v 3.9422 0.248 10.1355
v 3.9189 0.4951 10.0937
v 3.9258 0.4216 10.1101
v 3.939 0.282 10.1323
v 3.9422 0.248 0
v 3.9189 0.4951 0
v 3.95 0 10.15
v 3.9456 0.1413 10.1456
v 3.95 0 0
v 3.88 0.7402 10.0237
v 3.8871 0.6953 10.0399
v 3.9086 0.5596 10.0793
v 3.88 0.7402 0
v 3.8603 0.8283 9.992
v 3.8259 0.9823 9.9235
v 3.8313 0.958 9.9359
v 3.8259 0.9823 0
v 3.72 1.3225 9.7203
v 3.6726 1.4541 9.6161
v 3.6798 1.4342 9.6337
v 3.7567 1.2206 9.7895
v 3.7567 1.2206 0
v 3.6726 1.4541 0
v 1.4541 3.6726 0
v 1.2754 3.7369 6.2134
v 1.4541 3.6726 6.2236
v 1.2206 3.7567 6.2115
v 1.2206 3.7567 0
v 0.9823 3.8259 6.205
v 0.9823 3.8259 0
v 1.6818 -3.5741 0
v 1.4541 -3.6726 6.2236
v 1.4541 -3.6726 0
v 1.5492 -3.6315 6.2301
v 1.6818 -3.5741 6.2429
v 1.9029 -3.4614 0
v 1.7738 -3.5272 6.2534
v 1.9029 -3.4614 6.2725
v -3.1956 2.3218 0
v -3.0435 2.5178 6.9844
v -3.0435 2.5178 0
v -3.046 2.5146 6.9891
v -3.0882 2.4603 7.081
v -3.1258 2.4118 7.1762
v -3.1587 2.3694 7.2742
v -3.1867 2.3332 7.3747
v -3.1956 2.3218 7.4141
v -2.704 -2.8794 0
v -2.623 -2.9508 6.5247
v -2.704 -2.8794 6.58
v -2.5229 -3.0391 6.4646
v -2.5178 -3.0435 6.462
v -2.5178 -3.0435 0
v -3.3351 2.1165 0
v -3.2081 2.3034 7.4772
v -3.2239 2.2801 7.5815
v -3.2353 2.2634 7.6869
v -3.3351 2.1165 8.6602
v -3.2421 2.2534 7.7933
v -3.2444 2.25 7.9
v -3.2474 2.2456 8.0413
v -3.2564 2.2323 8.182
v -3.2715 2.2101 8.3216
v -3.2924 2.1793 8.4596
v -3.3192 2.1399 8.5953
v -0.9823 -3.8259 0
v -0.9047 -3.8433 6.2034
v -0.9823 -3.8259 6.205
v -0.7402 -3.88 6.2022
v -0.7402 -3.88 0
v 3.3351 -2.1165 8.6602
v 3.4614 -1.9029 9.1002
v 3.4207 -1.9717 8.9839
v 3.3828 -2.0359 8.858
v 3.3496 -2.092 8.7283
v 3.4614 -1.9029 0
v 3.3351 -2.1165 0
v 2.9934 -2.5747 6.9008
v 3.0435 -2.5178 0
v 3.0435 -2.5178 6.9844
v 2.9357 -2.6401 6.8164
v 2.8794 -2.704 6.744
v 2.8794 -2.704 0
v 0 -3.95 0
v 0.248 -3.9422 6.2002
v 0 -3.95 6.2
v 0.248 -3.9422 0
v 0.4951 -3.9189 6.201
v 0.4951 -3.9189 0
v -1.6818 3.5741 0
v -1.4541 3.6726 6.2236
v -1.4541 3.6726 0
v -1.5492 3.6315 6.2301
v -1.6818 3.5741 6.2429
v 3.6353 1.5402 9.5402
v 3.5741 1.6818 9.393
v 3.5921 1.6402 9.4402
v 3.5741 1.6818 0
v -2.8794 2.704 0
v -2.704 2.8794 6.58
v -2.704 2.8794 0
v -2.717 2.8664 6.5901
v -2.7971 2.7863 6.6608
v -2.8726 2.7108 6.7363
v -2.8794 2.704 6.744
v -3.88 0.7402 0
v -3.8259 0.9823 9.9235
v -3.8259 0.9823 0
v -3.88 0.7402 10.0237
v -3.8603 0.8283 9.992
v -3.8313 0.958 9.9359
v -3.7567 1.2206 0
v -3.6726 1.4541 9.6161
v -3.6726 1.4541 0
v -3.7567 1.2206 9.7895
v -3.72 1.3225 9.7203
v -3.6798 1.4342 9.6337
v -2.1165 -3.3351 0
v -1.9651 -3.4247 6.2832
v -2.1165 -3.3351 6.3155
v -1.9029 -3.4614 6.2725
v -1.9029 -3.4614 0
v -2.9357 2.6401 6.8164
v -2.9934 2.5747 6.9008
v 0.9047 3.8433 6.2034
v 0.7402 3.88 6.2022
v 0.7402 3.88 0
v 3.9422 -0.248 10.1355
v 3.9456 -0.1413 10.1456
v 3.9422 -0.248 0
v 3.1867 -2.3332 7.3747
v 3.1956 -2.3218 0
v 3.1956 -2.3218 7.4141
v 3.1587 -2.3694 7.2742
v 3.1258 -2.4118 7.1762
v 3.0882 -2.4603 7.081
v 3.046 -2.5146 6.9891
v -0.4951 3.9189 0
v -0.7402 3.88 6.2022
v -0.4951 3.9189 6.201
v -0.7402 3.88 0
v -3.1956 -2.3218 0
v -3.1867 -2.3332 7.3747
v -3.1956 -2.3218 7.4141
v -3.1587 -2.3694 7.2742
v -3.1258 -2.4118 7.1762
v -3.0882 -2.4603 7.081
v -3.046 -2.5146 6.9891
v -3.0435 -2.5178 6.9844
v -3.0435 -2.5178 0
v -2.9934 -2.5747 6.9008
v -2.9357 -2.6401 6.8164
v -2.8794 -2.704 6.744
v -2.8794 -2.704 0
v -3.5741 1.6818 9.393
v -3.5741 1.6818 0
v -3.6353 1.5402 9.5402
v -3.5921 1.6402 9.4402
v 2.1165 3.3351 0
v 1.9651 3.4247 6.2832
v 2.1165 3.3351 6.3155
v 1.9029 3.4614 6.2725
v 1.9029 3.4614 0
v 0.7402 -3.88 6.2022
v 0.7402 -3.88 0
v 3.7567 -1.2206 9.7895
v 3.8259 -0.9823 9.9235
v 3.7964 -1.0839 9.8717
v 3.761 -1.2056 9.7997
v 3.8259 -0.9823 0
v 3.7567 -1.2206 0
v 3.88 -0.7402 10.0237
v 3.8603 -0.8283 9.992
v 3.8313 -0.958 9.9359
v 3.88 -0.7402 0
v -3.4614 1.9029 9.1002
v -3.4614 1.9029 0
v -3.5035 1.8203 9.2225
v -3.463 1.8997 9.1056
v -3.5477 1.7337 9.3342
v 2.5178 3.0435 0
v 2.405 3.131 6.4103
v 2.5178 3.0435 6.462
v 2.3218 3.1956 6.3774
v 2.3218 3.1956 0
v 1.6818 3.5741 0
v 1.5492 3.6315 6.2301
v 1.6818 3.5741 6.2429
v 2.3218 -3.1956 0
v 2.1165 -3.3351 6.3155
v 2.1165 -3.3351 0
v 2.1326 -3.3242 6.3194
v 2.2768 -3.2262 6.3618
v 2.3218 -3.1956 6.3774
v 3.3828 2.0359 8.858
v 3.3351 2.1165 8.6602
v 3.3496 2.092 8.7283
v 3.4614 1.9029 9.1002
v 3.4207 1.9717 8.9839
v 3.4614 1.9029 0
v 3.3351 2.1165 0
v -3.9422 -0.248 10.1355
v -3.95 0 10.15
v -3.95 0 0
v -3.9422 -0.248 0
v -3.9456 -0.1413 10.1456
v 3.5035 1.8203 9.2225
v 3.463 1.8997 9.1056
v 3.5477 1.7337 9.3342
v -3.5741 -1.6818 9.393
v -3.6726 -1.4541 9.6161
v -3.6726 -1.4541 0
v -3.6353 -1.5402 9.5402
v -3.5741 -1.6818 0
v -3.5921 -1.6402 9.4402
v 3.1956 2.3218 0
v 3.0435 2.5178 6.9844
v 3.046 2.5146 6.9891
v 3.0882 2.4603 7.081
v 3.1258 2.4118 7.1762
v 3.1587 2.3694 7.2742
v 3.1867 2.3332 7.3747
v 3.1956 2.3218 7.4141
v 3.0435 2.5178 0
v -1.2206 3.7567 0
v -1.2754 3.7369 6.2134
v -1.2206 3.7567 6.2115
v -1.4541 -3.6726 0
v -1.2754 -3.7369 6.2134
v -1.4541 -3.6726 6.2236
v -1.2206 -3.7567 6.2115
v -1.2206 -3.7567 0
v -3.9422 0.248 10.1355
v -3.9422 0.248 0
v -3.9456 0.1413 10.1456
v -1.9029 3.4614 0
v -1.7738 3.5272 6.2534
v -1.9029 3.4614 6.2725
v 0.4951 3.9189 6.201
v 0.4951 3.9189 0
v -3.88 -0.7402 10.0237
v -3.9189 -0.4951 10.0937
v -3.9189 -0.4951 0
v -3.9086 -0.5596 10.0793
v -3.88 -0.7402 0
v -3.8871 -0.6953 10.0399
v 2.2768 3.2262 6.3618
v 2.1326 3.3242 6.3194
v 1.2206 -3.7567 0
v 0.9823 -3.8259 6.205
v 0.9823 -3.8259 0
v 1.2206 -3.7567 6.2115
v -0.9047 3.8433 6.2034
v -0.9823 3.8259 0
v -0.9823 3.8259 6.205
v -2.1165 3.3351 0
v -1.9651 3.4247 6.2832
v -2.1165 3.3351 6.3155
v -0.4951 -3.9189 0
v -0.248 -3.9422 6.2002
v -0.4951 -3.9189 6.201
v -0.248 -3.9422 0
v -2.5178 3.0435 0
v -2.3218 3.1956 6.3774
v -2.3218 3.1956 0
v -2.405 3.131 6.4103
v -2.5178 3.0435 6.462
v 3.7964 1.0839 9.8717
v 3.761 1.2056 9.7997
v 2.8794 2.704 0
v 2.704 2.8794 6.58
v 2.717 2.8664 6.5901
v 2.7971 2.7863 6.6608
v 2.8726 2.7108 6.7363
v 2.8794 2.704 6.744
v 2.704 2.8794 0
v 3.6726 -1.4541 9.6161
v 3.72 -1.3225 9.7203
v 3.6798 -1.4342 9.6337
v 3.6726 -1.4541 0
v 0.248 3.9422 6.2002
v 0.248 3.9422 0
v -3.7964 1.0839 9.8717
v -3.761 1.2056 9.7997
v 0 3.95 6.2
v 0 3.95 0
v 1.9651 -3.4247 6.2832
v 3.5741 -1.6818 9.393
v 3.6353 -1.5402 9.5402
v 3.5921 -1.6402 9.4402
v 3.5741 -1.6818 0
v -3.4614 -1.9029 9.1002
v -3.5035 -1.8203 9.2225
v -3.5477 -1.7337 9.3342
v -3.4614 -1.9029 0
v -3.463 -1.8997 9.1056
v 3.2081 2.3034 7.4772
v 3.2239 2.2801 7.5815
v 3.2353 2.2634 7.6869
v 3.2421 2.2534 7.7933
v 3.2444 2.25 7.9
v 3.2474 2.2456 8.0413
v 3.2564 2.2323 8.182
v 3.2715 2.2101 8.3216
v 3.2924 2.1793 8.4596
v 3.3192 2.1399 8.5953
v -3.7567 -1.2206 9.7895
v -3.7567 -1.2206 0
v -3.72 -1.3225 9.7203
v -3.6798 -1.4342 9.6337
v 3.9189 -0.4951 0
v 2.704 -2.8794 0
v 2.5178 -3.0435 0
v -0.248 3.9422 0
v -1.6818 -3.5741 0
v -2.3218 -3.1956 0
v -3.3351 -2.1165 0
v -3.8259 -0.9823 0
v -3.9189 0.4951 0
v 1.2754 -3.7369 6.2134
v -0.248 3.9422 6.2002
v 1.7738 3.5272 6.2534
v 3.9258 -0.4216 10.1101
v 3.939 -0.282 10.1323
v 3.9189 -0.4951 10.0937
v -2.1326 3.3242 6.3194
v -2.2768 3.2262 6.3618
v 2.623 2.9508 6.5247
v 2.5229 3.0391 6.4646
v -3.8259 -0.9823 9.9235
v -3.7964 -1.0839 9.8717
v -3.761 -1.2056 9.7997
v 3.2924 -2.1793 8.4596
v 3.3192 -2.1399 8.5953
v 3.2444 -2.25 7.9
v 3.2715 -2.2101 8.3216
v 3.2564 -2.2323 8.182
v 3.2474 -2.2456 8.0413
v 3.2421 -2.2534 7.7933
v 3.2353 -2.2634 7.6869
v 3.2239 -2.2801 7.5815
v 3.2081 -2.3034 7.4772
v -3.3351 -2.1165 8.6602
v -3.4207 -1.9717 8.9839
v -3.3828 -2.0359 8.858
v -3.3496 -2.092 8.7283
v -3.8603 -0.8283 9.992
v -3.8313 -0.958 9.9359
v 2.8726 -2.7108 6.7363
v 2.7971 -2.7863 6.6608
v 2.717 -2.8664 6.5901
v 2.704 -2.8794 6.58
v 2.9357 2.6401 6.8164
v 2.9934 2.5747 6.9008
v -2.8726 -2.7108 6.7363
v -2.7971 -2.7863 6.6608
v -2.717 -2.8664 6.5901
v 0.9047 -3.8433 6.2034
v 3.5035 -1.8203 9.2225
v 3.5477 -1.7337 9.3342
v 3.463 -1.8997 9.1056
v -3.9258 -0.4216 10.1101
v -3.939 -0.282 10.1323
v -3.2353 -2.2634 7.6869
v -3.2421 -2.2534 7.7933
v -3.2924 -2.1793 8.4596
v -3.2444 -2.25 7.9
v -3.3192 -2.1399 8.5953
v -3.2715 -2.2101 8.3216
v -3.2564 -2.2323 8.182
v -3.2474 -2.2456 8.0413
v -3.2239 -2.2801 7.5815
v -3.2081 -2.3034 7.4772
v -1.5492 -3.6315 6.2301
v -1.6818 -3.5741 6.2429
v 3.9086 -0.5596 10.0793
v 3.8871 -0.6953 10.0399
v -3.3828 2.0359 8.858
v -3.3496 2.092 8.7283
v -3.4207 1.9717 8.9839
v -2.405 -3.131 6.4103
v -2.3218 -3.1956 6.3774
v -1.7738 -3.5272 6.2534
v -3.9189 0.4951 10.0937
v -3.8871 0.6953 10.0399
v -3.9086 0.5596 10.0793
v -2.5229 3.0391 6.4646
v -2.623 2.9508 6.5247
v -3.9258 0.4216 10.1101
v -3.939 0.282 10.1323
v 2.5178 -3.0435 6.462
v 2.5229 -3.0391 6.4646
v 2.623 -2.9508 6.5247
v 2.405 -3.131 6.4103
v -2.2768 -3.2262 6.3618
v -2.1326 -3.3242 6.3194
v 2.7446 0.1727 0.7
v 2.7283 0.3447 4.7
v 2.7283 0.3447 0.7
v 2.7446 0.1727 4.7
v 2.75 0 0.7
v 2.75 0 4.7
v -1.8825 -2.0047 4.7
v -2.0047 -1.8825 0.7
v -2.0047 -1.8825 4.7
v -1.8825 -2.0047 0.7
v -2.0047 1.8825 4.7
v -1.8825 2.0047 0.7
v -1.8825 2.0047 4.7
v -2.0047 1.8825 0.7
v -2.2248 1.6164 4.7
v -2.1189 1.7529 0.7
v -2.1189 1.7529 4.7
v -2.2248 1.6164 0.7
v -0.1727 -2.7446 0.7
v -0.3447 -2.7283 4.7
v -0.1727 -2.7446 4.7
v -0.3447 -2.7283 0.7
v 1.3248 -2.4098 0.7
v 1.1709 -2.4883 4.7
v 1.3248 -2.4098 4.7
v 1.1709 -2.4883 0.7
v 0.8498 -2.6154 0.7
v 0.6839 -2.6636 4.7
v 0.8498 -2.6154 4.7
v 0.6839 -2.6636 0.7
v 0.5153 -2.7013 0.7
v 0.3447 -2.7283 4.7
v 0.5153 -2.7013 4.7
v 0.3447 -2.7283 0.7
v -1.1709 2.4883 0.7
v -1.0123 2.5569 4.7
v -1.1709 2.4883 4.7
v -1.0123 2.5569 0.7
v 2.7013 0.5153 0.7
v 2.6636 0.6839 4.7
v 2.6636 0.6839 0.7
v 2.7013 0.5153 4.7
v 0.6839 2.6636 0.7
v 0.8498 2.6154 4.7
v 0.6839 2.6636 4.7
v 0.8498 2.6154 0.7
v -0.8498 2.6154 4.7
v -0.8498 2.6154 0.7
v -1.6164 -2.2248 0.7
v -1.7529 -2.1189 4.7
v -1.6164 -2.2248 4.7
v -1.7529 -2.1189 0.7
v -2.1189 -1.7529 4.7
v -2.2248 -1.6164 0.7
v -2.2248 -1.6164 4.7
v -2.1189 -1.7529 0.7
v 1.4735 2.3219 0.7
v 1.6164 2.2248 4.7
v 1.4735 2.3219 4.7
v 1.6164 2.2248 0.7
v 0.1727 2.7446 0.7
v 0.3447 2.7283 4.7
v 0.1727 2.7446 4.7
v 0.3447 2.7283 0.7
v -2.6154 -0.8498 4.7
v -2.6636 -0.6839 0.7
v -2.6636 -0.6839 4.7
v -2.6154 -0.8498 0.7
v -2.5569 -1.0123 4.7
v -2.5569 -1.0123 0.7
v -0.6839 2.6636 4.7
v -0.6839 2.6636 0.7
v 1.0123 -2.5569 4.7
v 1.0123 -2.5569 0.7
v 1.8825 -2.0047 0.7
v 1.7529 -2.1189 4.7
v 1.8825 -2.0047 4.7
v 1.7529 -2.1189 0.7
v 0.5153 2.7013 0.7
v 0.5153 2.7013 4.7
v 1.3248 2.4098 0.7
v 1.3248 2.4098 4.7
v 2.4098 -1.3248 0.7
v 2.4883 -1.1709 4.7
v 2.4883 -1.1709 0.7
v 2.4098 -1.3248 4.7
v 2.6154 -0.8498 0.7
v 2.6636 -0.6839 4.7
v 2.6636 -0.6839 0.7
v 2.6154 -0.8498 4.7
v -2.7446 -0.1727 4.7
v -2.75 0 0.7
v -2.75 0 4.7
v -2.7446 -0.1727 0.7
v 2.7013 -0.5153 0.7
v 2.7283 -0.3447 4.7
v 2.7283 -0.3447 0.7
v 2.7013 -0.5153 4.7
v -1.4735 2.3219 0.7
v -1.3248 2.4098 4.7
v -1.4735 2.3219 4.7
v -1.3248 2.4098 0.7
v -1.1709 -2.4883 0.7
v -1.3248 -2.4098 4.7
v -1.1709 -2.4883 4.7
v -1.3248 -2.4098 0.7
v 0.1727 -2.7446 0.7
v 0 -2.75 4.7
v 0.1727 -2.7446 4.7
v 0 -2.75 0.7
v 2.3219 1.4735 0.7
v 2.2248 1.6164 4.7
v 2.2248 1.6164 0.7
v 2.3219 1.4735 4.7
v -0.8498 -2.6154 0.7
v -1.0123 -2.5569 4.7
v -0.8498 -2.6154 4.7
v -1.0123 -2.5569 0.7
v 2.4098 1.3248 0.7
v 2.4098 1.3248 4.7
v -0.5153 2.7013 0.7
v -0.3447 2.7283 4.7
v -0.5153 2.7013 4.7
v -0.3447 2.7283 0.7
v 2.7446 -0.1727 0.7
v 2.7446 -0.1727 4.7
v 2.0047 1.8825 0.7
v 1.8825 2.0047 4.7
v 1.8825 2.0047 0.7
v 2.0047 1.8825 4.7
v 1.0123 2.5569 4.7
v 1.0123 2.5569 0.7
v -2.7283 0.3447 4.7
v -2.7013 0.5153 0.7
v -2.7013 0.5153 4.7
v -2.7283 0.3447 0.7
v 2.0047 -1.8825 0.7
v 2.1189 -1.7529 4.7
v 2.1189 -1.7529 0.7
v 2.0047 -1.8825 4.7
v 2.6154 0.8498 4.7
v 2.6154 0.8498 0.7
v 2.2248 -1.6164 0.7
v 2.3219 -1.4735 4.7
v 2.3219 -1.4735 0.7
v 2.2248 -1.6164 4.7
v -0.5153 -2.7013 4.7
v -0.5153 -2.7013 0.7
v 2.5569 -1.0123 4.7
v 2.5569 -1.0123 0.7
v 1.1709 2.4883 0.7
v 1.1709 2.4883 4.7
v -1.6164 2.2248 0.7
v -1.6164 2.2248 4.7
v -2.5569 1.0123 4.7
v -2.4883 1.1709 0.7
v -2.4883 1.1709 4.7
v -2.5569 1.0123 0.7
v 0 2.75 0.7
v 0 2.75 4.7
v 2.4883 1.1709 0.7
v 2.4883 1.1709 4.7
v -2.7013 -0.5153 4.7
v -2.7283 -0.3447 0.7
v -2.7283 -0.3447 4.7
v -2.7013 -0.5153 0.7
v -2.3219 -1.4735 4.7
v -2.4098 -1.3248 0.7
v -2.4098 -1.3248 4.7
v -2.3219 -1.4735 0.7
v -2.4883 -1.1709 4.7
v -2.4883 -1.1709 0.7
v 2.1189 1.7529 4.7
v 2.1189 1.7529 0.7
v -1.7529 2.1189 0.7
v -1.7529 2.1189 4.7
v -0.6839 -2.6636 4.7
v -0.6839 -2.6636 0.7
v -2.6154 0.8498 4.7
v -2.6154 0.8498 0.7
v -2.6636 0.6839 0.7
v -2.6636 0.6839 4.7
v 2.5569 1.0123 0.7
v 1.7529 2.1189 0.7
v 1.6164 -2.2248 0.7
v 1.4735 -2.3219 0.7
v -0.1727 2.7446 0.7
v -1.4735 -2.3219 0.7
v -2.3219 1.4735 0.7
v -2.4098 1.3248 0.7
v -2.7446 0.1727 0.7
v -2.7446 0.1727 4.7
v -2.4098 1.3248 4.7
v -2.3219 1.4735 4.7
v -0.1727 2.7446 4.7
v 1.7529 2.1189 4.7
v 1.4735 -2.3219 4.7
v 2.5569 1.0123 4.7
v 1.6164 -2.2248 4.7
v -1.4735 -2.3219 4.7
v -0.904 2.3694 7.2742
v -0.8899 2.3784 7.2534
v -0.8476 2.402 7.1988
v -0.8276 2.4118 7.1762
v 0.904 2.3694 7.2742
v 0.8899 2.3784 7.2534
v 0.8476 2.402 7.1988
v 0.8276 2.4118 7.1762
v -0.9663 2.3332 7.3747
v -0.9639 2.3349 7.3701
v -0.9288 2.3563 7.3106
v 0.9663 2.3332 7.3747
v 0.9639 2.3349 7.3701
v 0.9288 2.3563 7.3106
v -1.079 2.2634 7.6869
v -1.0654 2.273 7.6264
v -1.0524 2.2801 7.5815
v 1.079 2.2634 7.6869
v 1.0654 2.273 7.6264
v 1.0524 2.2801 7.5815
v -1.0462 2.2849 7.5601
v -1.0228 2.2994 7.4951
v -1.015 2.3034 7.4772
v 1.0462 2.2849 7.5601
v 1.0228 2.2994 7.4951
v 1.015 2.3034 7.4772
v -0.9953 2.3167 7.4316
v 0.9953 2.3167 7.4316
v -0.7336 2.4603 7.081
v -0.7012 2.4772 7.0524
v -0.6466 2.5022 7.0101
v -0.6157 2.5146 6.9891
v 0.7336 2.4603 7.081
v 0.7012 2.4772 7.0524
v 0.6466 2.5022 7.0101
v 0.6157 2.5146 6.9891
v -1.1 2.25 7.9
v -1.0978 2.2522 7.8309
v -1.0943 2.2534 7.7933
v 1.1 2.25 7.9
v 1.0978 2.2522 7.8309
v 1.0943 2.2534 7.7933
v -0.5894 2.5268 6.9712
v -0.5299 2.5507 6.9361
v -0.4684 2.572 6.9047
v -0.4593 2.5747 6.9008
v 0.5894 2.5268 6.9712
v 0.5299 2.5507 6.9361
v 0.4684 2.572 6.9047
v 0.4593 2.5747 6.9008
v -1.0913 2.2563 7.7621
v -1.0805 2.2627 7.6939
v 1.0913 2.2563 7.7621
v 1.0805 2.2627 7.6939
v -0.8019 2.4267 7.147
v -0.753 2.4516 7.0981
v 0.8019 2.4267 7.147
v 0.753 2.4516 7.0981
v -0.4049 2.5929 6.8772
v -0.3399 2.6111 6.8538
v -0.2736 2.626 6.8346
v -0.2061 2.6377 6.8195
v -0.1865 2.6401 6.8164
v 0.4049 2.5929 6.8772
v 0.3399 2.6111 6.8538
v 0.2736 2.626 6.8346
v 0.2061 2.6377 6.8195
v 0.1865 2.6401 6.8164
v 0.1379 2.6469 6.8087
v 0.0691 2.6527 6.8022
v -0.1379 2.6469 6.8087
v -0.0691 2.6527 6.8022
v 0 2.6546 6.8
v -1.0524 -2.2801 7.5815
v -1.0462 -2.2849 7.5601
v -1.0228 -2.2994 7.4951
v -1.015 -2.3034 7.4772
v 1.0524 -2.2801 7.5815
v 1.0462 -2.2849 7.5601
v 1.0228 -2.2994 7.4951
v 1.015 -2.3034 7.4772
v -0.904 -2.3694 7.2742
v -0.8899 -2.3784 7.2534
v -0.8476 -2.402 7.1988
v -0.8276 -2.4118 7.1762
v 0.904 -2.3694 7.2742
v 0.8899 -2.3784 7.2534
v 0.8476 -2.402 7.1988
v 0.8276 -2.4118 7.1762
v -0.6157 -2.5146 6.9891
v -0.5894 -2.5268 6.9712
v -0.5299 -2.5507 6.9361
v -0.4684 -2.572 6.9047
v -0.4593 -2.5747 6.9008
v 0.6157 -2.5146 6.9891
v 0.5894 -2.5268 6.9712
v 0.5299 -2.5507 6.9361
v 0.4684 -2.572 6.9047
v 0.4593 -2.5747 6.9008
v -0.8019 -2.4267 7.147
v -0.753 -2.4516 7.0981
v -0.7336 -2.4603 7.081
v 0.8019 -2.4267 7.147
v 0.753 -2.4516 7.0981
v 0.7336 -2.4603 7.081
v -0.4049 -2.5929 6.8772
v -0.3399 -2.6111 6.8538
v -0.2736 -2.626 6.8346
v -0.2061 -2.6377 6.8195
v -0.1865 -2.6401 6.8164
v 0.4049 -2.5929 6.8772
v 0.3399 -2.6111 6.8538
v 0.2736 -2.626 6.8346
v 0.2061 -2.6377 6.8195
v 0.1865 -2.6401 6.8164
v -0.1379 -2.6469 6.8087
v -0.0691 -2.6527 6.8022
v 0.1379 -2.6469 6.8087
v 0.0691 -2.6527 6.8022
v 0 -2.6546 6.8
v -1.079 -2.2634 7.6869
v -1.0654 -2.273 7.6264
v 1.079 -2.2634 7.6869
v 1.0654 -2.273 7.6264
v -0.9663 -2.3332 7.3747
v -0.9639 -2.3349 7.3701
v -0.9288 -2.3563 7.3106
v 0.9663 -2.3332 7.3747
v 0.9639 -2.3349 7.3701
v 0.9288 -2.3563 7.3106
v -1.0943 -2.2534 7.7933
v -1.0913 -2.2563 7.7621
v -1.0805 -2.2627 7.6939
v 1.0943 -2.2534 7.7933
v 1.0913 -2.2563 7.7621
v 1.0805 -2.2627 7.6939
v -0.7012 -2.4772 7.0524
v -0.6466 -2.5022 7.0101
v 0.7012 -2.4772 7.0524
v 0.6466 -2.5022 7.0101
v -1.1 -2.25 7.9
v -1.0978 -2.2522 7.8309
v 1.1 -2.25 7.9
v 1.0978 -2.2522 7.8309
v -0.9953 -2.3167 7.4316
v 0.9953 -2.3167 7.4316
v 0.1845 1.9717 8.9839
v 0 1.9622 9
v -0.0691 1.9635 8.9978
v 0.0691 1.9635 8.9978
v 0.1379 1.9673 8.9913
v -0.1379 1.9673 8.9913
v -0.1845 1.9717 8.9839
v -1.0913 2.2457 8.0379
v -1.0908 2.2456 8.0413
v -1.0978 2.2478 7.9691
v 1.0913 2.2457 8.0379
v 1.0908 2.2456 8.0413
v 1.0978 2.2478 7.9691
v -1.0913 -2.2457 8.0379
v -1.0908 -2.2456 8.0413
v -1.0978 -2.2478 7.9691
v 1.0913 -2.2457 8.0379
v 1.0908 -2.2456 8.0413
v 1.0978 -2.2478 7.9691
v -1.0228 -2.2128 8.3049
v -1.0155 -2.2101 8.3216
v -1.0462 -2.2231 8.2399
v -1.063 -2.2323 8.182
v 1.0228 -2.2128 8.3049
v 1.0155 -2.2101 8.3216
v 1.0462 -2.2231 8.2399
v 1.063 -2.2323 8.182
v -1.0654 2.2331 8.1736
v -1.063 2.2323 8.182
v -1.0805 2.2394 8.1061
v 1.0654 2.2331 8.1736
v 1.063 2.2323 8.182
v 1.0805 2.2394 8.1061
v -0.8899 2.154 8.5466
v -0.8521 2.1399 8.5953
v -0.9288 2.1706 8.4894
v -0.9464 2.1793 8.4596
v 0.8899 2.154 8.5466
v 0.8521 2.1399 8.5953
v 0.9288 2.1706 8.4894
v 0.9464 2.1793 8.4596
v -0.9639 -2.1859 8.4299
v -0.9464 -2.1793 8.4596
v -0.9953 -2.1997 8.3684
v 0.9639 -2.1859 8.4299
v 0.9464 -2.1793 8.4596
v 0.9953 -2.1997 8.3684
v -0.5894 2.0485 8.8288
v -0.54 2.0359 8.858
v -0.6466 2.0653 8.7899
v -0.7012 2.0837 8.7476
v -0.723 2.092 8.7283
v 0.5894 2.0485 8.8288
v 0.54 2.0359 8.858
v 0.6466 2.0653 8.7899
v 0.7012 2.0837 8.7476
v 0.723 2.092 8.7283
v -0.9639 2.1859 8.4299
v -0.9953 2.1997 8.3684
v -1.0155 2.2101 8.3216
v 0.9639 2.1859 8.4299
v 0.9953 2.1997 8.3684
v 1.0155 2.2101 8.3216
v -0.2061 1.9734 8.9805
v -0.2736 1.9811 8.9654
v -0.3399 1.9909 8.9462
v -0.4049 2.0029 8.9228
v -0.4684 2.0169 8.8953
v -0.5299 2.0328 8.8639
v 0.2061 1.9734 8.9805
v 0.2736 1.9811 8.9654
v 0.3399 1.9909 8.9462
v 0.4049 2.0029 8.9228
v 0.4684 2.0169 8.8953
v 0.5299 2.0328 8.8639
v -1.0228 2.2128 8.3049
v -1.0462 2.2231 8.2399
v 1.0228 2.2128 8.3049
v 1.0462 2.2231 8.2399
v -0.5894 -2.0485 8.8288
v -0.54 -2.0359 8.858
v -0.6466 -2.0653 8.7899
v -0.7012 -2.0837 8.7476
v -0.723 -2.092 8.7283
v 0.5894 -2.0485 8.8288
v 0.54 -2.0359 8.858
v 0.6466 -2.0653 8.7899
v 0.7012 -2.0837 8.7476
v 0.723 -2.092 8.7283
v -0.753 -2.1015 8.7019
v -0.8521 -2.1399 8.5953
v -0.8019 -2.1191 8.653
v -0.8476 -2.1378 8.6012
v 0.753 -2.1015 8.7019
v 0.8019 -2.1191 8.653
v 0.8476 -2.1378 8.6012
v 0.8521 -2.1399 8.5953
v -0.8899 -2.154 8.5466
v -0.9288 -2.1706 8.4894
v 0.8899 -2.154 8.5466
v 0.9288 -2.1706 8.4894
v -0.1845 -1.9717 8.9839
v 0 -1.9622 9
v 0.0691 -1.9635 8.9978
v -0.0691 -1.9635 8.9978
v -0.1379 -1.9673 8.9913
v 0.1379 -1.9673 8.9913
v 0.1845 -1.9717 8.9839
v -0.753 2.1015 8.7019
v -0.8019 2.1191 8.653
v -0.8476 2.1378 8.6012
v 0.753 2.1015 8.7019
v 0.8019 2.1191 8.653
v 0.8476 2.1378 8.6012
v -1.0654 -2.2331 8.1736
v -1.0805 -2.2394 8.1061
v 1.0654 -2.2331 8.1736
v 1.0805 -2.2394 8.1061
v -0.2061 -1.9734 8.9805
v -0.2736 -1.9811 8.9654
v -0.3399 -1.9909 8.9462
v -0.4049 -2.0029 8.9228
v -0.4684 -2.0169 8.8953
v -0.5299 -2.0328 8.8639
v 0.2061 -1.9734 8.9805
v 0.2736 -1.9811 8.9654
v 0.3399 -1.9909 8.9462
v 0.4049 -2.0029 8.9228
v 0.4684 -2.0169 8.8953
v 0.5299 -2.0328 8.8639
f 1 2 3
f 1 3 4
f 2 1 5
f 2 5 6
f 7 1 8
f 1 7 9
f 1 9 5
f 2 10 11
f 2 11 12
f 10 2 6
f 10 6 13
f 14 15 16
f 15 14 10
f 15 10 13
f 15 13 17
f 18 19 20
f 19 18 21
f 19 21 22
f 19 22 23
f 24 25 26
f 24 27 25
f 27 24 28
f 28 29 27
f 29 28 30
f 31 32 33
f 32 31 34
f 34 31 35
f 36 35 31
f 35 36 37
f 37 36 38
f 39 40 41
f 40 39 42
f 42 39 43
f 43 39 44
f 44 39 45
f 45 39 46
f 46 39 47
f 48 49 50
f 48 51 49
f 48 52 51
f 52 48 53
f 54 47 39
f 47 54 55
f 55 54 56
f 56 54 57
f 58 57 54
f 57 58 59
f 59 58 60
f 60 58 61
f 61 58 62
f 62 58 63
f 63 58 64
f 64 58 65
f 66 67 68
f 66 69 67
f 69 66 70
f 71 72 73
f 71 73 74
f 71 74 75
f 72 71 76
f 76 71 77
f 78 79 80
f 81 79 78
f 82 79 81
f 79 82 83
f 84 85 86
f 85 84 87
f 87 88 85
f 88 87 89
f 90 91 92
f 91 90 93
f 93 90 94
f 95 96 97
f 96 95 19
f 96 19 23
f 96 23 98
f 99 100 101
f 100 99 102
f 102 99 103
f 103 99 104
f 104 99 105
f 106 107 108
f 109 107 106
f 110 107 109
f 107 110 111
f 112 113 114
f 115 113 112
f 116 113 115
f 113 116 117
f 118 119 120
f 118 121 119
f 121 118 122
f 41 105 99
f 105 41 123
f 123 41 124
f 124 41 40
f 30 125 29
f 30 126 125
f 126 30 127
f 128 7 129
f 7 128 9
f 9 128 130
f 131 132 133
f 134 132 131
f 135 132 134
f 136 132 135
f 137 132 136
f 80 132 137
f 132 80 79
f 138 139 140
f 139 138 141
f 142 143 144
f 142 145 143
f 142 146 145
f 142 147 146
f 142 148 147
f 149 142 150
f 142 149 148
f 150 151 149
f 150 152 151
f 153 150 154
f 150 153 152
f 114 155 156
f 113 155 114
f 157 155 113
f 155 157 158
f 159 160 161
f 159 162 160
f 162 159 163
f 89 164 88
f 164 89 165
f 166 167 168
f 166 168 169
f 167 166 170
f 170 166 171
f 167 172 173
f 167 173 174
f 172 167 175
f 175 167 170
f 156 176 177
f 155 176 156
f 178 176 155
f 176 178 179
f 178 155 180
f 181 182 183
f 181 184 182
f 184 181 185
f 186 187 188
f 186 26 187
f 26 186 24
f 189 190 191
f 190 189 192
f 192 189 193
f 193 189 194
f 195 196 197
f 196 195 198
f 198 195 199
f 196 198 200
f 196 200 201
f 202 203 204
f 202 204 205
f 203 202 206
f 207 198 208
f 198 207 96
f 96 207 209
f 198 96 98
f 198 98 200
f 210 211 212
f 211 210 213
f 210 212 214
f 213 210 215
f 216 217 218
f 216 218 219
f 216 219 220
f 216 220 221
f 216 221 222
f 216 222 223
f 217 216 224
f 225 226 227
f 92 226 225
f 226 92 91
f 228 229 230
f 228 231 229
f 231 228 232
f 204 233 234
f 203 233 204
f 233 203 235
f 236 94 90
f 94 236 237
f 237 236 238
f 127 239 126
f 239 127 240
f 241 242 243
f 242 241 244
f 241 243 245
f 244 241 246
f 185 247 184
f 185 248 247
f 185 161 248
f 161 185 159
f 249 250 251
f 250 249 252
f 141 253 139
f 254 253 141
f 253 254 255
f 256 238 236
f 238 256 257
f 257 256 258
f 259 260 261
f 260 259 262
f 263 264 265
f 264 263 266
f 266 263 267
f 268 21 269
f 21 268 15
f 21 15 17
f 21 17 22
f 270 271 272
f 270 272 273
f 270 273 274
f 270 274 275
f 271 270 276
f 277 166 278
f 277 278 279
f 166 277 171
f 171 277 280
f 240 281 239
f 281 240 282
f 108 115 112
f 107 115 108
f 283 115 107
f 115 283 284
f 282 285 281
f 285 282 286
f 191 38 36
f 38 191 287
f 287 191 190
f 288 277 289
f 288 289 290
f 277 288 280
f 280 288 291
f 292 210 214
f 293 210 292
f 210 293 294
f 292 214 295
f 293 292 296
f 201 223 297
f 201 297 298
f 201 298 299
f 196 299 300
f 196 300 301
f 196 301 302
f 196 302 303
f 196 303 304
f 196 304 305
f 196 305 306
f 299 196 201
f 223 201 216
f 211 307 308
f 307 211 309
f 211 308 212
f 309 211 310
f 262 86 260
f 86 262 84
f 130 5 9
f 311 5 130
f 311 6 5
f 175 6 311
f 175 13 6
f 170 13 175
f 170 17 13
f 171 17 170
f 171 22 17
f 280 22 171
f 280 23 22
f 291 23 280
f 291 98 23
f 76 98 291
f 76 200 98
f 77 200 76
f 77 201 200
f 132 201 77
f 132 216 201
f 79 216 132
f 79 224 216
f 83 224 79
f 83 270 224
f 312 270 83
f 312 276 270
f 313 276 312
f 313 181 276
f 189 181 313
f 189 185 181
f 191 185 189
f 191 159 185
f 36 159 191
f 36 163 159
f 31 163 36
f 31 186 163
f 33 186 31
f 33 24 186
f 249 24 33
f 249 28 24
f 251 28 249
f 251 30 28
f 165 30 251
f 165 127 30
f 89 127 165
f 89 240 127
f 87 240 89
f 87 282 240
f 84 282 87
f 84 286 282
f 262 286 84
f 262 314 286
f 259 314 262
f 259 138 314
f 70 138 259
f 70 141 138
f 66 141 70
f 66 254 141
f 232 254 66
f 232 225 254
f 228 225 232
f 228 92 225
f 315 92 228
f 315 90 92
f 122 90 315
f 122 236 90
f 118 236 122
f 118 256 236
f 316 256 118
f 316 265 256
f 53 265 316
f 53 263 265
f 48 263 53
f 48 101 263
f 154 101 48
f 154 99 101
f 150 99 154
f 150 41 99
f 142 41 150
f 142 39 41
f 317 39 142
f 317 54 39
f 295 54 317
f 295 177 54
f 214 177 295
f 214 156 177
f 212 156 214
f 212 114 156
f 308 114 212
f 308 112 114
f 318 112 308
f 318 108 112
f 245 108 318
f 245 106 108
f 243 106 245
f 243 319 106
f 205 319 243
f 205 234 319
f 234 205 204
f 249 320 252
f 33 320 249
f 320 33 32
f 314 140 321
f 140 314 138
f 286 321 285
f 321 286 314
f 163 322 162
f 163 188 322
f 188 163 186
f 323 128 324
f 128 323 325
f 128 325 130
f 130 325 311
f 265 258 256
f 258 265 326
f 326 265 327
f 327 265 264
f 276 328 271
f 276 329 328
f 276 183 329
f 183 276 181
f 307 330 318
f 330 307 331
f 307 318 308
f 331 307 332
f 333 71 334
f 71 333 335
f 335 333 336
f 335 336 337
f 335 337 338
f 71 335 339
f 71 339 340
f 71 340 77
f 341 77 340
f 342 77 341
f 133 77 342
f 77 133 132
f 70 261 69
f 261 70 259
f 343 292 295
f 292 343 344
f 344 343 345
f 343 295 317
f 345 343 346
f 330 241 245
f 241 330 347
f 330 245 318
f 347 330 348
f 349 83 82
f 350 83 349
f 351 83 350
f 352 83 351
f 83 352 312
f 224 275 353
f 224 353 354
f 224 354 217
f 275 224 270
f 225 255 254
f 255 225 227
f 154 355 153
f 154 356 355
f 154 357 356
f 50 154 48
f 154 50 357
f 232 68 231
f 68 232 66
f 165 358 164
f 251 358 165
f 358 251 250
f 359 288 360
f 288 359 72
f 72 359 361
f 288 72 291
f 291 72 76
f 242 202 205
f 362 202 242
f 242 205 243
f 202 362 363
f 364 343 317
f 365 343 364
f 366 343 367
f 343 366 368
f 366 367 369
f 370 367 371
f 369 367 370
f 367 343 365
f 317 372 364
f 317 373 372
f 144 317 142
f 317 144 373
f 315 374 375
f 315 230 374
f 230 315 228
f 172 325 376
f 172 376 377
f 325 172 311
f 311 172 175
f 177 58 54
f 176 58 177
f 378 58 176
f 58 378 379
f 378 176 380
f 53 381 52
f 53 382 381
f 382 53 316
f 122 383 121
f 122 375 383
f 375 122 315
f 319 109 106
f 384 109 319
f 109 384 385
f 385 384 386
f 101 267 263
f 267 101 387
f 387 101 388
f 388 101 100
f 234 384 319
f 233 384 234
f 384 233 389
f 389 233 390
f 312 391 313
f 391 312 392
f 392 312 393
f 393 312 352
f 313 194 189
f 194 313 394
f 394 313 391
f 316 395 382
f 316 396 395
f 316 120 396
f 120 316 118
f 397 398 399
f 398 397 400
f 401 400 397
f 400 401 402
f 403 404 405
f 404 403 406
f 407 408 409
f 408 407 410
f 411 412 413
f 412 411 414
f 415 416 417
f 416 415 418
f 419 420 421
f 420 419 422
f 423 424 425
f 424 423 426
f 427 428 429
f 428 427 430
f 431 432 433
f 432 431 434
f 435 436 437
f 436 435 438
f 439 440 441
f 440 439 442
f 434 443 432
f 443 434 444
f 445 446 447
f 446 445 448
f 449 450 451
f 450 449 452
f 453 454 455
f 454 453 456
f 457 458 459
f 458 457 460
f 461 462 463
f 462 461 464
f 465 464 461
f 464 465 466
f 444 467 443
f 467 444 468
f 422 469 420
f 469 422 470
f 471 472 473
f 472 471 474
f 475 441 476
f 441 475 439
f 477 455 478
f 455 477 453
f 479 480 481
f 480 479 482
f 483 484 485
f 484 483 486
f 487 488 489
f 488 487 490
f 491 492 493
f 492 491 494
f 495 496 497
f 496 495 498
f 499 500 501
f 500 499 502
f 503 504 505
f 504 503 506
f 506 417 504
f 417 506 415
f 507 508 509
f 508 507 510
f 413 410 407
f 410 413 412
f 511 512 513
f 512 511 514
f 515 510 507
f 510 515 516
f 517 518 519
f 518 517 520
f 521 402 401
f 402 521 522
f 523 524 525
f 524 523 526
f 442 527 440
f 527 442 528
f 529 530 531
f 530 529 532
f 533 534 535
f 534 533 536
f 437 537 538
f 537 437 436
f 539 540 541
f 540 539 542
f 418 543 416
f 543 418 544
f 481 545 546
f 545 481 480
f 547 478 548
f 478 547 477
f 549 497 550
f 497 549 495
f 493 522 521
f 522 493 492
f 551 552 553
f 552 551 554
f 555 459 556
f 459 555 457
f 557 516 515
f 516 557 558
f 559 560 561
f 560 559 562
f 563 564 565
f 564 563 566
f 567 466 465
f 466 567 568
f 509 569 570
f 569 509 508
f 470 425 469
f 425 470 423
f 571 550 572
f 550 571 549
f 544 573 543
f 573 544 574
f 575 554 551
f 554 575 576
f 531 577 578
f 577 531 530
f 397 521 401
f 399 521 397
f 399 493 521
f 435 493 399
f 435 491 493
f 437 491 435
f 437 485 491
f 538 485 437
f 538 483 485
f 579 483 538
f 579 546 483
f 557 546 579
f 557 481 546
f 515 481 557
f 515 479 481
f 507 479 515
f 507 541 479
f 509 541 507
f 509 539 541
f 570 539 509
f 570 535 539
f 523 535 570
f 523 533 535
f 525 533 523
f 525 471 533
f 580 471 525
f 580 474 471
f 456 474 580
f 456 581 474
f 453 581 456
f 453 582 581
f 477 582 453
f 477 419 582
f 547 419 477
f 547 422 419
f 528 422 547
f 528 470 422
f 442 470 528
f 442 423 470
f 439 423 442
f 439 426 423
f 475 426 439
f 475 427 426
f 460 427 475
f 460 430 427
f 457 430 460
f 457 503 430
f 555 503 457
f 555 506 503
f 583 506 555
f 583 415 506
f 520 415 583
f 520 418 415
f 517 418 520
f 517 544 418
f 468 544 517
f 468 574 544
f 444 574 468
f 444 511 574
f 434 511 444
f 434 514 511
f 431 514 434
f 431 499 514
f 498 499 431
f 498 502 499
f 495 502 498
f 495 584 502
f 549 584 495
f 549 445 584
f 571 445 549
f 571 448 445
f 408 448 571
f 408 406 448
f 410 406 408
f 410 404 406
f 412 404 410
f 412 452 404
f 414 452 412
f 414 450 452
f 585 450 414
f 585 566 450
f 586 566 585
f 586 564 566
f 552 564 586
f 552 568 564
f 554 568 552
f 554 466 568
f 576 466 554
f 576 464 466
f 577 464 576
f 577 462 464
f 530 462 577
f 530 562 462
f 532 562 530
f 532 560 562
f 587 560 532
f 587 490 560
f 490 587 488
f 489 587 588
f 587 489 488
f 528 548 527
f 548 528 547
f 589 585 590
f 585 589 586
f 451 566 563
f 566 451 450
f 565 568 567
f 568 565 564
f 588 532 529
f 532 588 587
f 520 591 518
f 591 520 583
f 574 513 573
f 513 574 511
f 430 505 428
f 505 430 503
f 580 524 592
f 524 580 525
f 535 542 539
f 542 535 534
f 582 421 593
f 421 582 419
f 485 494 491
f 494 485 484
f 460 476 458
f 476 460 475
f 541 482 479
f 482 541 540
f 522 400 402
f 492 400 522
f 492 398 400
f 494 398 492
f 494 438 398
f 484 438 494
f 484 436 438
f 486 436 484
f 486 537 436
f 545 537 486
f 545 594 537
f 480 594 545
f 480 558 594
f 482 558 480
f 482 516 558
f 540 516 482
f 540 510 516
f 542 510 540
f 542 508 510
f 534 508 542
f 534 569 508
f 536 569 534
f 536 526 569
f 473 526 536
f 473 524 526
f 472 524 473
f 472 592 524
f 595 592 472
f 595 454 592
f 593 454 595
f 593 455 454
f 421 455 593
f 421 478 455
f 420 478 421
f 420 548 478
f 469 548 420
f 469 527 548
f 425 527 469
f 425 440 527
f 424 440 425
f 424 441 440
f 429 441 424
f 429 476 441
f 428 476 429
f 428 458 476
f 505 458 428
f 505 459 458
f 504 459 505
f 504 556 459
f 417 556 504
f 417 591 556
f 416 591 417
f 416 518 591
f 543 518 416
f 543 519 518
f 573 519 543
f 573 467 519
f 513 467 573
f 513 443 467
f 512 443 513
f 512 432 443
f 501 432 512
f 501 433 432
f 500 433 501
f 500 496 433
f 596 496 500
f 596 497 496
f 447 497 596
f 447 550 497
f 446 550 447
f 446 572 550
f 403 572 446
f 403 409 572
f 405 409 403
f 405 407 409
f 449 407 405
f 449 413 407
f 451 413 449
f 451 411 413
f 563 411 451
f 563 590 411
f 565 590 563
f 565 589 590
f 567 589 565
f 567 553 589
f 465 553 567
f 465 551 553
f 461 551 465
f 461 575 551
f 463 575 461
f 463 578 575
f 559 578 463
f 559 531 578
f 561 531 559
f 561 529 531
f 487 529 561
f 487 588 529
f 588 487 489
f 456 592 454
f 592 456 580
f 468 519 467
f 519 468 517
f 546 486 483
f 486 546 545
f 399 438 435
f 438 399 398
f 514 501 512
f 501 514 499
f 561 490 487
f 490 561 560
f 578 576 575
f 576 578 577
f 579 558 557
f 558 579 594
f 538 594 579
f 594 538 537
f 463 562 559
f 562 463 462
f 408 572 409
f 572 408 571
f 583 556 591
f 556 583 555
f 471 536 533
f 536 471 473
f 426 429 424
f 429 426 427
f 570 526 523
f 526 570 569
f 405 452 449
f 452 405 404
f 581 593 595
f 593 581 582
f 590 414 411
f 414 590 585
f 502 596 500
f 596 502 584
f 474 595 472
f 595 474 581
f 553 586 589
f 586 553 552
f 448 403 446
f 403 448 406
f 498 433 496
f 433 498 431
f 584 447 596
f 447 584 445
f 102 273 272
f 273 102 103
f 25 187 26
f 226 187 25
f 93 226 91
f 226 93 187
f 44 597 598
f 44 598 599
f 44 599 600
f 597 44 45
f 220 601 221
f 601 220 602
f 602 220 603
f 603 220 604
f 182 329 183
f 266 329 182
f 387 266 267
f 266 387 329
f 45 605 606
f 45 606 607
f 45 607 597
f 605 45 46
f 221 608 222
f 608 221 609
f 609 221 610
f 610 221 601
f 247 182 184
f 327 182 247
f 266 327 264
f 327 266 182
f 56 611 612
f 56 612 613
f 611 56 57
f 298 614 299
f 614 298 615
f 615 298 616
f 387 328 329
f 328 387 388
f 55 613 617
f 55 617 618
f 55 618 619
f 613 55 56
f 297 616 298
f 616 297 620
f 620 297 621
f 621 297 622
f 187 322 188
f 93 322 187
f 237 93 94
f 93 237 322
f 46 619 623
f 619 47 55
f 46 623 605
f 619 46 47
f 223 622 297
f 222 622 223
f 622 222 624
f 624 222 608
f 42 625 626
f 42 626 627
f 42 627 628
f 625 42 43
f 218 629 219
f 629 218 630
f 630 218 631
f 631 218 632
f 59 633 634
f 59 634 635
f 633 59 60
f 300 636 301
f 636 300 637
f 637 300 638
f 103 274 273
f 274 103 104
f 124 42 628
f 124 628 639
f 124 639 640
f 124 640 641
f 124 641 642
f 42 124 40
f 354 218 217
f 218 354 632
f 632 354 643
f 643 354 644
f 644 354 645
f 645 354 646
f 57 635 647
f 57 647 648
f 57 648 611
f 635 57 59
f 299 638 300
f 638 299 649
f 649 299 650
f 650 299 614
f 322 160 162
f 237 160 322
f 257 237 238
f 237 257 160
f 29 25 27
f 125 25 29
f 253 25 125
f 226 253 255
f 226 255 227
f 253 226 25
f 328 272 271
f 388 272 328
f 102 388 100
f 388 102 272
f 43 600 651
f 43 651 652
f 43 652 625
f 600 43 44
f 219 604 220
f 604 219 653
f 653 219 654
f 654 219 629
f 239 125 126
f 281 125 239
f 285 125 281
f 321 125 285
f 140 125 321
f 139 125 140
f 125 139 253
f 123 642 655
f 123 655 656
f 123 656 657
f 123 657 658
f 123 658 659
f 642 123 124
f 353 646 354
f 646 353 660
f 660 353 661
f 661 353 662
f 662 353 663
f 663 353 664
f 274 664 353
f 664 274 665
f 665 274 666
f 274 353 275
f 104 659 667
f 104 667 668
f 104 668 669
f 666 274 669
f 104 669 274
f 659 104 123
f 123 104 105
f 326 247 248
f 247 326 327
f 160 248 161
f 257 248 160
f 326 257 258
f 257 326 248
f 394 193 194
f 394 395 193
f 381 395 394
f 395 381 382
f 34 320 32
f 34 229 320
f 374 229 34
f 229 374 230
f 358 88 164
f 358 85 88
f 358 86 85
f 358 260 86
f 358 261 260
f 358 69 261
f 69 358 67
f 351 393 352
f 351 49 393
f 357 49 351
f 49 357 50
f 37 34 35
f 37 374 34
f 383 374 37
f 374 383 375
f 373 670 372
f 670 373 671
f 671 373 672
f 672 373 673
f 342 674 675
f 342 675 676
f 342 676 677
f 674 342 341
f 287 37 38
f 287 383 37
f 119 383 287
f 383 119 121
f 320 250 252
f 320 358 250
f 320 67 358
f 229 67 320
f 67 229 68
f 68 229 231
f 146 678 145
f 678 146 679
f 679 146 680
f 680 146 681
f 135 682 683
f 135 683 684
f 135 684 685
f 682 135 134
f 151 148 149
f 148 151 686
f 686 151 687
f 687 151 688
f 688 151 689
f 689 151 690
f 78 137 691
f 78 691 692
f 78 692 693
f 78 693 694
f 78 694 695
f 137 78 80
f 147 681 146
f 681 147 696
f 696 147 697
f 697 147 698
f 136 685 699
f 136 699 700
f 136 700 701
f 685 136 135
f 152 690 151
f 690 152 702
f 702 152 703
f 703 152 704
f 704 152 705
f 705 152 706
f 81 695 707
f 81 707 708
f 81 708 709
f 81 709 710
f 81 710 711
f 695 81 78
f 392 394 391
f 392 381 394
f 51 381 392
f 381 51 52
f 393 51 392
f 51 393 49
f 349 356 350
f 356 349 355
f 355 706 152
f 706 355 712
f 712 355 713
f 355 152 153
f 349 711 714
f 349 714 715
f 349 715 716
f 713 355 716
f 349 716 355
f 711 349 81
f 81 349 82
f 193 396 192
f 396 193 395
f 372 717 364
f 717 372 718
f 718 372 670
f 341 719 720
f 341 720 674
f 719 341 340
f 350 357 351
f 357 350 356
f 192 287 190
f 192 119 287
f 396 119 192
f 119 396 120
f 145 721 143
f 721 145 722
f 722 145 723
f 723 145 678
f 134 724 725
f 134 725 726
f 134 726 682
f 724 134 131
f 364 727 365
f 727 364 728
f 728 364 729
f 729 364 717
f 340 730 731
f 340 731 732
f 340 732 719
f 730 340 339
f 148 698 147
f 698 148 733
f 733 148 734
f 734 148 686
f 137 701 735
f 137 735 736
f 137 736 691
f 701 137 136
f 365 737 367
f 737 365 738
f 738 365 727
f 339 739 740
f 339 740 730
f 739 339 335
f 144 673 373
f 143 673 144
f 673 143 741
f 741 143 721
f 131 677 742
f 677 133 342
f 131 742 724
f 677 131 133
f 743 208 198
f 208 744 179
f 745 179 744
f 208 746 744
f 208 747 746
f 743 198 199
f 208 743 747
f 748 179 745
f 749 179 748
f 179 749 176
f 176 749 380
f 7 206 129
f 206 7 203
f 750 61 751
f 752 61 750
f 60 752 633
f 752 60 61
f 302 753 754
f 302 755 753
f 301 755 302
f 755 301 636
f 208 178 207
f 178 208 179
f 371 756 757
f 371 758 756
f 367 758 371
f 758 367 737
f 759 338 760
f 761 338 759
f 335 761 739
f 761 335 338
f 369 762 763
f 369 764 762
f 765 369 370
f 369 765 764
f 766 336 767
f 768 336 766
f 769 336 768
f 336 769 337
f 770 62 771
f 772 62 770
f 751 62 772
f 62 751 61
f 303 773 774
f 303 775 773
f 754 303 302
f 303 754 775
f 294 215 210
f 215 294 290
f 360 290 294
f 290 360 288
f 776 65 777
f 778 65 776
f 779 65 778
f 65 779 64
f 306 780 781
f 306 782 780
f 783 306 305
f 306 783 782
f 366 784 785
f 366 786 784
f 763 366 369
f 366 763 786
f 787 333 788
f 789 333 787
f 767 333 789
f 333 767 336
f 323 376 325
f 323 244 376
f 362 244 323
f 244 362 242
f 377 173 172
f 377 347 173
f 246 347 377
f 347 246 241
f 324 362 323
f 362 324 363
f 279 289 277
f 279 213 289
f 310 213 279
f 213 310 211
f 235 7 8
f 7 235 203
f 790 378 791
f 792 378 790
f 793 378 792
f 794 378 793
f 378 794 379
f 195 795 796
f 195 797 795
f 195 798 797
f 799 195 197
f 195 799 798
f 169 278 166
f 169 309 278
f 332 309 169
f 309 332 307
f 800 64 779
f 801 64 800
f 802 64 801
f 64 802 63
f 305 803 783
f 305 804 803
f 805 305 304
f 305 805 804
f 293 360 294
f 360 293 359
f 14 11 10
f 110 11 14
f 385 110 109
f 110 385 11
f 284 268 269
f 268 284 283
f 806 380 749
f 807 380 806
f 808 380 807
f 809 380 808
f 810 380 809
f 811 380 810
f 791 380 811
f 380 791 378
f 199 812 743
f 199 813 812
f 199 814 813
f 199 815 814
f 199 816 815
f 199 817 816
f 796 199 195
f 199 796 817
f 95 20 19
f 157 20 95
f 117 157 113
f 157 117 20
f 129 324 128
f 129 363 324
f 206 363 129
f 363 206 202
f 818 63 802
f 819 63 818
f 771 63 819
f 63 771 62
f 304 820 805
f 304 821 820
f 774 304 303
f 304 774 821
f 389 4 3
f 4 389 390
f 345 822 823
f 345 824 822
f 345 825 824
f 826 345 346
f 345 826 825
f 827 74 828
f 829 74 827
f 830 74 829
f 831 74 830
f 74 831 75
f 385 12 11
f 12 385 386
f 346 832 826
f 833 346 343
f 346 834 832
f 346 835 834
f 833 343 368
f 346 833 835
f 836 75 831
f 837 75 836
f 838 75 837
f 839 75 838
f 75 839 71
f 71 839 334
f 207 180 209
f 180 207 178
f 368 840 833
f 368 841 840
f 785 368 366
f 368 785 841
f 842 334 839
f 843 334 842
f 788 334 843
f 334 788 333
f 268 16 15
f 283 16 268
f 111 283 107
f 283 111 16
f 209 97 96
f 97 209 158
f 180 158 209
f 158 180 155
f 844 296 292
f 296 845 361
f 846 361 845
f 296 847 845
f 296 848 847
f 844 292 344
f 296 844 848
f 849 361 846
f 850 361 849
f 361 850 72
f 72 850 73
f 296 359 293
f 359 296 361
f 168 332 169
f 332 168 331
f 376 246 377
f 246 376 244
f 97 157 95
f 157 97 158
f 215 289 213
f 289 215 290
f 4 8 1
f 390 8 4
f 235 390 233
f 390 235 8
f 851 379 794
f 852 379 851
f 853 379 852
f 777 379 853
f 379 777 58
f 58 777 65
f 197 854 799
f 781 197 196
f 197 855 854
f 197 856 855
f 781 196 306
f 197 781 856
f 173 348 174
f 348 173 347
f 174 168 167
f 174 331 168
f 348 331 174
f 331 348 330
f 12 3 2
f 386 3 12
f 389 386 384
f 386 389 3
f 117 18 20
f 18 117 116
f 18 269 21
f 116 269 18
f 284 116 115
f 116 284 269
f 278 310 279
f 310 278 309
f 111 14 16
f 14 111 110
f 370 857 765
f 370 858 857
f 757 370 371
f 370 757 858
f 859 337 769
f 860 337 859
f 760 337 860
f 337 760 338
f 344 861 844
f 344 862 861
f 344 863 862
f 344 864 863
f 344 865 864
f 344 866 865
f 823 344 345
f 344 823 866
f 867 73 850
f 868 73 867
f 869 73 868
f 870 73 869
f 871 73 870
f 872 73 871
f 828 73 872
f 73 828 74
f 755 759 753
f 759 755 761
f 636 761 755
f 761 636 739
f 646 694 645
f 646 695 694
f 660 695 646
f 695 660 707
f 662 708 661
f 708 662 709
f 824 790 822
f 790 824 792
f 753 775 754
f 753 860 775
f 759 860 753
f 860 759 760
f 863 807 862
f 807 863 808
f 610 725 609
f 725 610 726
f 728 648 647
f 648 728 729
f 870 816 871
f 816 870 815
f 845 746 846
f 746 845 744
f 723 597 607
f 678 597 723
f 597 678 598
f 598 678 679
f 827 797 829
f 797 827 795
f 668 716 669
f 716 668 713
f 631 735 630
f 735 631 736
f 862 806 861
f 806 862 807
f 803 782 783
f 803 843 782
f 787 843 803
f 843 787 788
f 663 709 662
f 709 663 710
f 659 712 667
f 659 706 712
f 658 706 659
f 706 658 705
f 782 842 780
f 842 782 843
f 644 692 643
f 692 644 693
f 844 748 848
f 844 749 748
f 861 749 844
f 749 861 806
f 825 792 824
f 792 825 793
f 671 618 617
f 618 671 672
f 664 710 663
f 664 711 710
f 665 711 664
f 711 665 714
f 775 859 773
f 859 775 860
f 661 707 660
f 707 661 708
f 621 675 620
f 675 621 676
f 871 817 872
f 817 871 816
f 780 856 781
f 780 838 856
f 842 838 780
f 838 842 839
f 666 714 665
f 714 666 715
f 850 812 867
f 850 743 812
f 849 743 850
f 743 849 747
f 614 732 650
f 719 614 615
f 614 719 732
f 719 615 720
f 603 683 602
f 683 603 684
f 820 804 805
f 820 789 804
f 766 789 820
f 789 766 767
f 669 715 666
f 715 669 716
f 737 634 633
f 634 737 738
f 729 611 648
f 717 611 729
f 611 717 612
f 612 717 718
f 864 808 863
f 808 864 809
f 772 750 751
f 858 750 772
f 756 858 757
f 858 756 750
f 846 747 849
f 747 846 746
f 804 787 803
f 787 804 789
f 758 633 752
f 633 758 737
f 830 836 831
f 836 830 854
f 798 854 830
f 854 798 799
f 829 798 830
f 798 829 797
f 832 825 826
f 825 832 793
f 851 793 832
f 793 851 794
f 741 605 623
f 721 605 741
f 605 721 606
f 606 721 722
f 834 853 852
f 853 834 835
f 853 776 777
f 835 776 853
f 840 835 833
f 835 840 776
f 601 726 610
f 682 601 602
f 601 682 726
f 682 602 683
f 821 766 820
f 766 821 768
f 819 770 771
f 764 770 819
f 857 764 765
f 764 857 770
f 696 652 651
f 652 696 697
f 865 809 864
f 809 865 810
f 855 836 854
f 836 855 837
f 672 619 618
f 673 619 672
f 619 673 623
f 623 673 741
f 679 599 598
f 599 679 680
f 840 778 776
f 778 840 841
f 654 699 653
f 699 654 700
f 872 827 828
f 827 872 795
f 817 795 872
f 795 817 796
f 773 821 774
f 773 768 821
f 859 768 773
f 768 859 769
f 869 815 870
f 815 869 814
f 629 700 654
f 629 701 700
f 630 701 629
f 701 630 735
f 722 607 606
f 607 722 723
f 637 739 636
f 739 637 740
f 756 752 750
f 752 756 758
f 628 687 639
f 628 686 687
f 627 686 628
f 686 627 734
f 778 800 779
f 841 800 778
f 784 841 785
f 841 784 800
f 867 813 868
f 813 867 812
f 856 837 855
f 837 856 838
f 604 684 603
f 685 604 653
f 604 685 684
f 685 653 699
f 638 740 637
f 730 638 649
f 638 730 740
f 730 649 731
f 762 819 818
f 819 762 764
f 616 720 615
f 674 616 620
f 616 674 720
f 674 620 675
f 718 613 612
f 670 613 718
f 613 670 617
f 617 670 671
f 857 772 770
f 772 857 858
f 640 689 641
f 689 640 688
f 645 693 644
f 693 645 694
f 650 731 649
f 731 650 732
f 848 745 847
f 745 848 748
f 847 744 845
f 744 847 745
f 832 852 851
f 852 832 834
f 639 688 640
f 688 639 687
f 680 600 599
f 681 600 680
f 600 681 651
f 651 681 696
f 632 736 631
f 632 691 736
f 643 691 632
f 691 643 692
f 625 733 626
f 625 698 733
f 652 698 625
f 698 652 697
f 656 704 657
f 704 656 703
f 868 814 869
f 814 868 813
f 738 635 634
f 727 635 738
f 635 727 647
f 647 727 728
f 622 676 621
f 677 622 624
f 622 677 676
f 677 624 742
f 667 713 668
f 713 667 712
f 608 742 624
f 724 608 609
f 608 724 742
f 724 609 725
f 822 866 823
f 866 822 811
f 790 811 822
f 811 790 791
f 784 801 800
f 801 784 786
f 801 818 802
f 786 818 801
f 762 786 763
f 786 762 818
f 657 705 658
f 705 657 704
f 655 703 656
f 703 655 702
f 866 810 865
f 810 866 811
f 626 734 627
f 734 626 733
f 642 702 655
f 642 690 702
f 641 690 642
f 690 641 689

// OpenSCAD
//base thickness
base = 0.7;
//number of magnets
magnets = 4;
//height of each magnet
magnet_height = 1;
//diameter of each magnet
magnet_diameter = 5.5;
//wall thickness around magnets
walls = 1.2;
//material above magnets
top = 1.5;
//change this to change the thickness of the top part
top_curve = 1.7;
hole_diameter = 2.2;

/* [Hidden] */
$fn=100;
//Calculations
top_thickness = magnet_diameter + 2*walls - top_curve*2;

difference(){
	union(){
		difference(){
			//external cylinder
			cylinder(h = magnets*magnet_height + base + top + top_curve, d = magnet_diameter + 2*walls);
			//internal cylinder
			translate([0,0,base]) cylinder(h = magnets*magnet_height, d = magnet_diameter);
			translate([-(magnet_diameter + 2*walls)/2,top_thickness/2 + top_curve,magnets*magnet_height + base + top + top_curve])rotate([0,90,0])cylinder(h = magnet_diameter + 2*walls, r = top_curve);
			translate([-(magnet_diameter + 2*walls)/2,-(top_thickness/2 + top_curve),magnets*magnet_height + base + top + top_curve])rotate([0,90,0])cylinder(h = magnet_diameter + 2*walls, r = top_curve);
		}

		intersection(){
			translate([0,0,magnets*magnet_height + base + top + top_curve]) cylinder(h = top_thickness/2, d = magnet_diameter + 2*walls);
			translate([-(magnet_diameter + 2*walls)/2,0,magnets*magnet_height + base + top + top_curve])rotate([0,90,0])cylinder(h = magnet_diameter + 2*walls, d = top_thickness);
		}
	}
	translate([0,(magnet_diameter + 2*walls)/2,magnets*magnet_height + base + top + top_curve])rotate([90,0,0])cylinder(h = magnet_diameter + 2*walls, d= hole_diameter);
}
